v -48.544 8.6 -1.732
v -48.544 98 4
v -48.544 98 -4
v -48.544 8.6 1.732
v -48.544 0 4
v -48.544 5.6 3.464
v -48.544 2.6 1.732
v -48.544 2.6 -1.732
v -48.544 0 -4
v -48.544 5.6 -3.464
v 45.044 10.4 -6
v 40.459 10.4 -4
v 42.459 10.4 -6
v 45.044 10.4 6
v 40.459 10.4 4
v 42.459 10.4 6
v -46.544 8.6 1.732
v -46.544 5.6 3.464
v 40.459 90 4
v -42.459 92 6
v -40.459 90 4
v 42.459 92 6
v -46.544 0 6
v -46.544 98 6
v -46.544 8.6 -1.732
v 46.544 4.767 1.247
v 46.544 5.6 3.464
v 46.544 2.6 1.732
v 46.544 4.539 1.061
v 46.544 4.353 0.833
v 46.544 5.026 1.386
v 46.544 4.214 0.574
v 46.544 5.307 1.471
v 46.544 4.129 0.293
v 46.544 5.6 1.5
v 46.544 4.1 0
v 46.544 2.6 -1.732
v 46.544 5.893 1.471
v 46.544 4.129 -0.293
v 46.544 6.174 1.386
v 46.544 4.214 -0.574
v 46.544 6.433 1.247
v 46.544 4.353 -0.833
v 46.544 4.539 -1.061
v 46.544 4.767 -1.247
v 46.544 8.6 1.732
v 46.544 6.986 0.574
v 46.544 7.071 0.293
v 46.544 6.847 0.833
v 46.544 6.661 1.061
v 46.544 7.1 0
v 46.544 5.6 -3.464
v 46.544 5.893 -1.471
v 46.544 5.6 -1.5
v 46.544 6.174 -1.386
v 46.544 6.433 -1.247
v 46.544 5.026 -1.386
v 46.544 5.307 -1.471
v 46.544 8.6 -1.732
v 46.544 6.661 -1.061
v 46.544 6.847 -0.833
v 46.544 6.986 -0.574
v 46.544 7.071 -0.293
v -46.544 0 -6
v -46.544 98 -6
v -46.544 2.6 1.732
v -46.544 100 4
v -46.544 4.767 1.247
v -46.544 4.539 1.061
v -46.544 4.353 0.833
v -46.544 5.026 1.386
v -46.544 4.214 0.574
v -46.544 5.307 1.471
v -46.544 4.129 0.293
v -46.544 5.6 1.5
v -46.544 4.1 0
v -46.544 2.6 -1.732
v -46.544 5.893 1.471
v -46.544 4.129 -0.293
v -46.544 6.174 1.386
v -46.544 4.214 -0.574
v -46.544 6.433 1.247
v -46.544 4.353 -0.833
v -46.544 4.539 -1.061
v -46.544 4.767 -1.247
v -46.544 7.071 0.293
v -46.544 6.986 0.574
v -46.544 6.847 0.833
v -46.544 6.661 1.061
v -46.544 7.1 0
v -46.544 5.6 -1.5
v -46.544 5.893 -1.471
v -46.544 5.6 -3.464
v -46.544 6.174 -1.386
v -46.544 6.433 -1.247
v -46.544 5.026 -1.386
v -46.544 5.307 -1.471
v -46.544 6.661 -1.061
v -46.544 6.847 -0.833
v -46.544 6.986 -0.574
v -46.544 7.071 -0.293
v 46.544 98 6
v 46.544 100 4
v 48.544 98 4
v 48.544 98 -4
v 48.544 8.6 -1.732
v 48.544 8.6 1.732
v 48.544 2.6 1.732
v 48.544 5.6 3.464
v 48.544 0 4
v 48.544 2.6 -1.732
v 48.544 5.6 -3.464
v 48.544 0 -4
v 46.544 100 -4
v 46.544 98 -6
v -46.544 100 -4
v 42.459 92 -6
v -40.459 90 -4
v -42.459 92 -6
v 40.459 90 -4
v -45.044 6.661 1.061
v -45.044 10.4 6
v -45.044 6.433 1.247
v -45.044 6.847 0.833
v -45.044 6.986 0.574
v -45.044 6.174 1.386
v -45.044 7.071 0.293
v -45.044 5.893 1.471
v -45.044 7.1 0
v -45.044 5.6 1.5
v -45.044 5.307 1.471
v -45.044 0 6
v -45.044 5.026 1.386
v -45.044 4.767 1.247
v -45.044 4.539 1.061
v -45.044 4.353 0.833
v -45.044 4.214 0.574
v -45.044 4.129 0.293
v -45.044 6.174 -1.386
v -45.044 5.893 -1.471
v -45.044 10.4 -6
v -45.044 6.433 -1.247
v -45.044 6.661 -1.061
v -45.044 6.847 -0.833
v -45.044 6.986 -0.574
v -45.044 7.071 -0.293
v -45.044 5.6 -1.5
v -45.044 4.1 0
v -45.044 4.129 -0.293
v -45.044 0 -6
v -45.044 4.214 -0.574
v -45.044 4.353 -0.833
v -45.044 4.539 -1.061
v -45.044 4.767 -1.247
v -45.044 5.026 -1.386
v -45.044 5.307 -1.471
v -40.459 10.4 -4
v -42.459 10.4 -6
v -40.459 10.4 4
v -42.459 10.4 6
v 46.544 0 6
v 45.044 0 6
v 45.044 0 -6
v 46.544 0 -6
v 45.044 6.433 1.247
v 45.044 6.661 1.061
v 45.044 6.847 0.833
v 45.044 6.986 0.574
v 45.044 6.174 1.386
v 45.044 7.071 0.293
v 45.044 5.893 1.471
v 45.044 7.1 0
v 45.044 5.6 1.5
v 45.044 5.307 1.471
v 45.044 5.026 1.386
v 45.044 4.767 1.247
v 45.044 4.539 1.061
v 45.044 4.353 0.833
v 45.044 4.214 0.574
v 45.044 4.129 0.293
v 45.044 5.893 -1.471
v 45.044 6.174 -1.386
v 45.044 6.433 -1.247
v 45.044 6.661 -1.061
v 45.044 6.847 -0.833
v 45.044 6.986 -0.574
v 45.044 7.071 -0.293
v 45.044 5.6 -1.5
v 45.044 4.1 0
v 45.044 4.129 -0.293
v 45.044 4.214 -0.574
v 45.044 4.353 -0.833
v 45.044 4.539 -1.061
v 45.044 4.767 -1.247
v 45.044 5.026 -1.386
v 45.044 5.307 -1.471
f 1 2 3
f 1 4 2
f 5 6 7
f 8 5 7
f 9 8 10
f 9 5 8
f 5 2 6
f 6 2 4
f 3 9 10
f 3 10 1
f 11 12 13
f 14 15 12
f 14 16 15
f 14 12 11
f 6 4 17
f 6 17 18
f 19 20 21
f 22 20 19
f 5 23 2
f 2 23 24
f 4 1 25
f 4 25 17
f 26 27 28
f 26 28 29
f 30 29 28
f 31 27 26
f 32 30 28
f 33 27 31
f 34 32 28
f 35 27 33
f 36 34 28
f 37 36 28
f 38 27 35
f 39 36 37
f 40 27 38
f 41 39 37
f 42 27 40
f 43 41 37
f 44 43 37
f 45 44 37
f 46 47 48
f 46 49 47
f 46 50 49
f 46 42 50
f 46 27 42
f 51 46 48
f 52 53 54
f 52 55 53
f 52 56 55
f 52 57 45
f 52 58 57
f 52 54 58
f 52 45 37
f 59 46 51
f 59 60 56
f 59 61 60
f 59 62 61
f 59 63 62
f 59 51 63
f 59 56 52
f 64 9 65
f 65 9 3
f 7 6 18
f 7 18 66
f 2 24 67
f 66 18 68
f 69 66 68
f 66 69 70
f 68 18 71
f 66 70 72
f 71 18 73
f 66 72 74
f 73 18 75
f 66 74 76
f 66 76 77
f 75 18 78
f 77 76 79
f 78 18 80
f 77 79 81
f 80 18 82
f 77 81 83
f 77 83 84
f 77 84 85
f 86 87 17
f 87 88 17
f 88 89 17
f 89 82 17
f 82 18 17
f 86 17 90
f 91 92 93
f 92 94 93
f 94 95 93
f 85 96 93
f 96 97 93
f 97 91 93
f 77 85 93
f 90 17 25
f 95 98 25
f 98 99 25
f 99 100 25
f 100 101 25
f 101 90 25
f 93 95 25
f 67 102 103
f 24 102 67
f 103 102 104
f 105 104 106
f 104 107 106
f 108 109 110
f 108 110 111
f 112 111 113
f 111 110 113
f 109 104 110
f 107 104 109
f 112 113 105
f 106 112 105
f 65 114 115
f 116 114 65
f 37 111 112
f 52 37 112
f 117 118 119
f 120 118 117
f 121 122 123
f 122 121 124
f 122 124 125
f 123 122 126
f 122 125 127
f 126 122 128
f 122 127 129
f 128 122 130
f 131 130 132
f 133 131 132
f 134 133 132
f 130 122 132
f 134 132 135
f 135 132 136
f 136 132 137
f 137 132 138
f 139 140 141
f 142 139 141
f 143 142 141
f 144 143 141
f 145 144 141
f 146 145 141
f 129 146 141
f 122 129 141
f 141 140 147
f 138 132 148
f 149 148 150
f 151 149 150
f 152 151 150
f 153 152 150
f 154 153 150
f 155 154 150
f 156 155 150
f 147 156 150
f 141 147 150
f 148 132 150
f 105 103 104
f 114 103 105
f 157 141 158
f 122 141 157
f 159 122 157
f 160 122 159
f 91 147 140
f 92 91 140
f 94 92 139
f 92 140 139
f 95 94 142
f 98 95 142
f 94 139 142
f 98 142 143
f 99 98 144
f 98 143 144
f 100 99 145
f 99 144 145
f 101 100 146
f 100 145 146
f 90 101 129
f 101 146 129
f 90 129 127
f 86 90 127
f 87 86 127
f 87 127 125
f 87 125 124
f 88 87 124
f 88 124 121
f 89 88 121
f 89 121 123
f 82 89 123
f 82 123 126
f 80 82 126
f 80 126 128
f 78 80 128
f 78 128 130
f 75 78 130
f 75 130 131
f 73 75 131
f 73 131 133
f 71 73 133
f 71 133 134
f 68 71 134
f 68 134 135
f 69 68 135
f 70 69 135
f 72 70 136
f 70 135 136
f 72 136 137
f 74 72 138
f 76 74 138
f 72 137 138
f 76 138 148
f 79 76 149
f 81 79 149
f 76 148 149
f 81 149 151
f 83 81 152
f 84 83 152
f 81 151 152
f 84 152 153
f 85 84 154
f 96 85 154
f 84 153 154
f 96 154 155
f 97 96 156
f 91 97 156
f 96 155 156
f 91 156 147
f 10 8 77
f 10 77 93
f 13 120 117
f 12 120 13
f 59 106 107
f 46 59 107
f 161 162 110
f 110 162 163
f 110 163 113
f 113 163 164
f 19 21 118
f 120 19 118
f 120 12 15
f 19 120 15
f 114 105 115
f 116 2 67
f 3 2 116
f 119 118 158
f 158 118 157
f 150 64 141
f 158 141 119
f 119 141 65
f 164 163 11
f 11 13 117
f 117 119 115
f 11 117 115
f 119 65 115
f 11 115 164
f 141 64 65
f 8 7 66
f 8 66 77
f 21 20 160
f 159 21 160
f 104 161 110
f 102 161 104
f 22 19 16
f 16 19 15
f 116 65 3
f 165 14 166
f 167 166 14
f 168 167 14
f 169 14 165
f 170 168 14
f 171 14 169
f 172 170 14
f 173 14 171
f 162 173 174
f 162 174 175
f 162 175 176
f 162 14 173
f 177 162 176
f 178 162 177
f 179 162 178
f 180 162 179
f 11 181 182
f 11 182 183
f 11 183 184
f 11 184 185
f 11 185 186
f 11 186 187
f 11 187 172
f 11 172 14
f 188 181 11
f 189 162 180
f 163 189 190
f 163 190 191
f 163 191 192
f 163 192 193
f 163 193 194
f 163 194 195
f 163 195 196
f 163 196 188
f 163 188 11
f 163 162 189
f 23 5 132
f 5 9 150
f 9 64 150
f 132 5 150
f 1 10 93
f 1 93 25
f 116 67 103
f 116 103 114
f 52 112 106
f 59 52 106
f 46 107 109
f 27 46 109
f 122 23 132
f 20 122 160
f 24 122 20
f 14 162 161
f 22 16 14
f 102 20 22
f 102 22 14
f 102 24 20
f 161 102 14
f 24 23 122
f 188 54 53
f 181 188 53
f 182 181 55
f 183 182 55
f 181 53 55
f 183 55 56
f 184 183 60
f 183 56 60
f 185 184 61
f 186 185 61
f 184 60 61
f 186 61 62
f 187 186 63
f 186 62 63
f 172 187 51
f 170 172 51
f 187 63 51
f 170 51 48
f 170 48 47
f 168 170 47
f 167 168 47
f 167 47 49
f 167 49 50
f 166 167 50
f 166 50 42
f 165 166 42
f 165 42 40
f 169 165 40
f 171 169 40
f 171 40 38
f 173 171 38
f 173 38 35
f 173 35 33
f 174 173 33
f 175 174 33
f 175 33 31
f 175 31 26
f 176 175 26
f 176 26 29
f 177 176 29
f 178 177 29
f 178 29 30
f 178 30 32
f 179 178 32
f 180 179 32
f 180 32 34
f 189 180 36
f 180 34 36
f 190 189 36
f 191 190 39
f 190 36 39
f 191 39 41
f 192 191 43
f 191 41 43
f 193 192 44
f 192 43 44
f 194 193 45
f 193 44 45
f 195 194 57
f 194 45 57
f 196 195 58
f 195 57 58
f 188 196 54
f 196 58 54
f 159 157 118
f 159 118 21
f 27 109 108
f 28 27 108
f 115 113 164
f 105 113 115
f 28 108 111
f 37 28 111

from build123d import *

# Parameters (mm, degrees)
SKETCH1_W             = 3.5
SKETCH1_H             = 12
BOSS_EXTRUDE1_DEPTH   = 100
BOSS_EXTRUDE1_2_DEPTH = 100
SKETCH2_W             = 12
SKETCH2_H             = 10
BOSS_EXTRUDE2_DEPTH   = 90.08829946
SKETCH3_W             = 4.58560389
SKETCH3_H             = 12
BOSS_EXTRUDE3_DEPTH   = 79.6
CHAMFER6_SIZE         = 2
CUT_EXTRUDE1_DEPTH    = 2
CUT_EXTRUDE2_REACH    = 140.122
SKETCH5_R             = 1.5


with BuildPart() as part:
    # Sketch1 → Boss-Extrude1 (new body)
    with BuildSketch(Plane(origin=(0, 0, 0), x_dir=(1, 0, 0), z_dir=(0, 1, 0))):
        with Locations((-46.79414973, 0)):
            Rectangle(SKETCH1_W, SKETCH1_H)
    extrude(amount=BOSS_EXTRUDE1_DEPTH)



with BuildPart() as body_2:
    # Sketch1 → Boss-Extrude1 2 (new body)
    with BuildSketch(Plane(origin=(0, 0, 0), x_dir=(1, 0, 0), z_dir=(0, 1, 0))):
        with Locations((46.79414973, 0)):
            Rectangle(SKETCH1_W, SKETCH1_H)
    extrude(amount=BOSS_EXTRUDE1_2_DEPTH)


with BuildPart() as part_1:
    add(part.part)

    add(body_2.part)  # Boss-Extrude2 merges body 2
    # Sketch2 → Boss-Extrude2 (add)
    with BuildSketch(Plane(origin=(-45.04414973, 0, 0), x_dir=(0, 0, -1), z_dir=(1, 0, 0))):
        with Locations((0, 95)):
            Rectangle(SKETCH2_W, SKETCH2_H)
    extrude(amount=BOSS_EXTRUDE2_DEPTH)

    # Sketch3 → Boss-Extrude3 (add)
    with BuildSketch(Plane.XZ.offset(-90)):
        with Locations((-42.751347785, 0)):
            Rectangle(SKETCH3_W, SKETCH3_H)
        with Locations((42.751347785, 0)):
            Rectangle(SKETCH3_W, SKETCH3_H)
    extrude(amount=BOSS_EXTRUDE3_DEPTH)

    # Chamfer6
    chamfer6_edges = [part_1.edges().sort_by_distance(p)[0] for p in [
        (0, 100, 6),
        (48.54414973, 50, 6),
        (48.54414973, 50, -6),
        (48.54414973, 100, 0),
        (0, 100, -6),
        (-40.45854584, 50.2, -6),
        (-40.45854584, 50.2, 6),
        (0, 90, 6),
        (0, 90, -6),
        (40.45854584, 50.2, 6),
        (40.45854584, 50.2, -6),
        (-48.54414973, 50, 6),
        (-48.54414973, 50, -6),
        (-48.54414973, 100, 0),
    ]]
    chamfer(chamfer6_edges, length=CHAMFER6_SIZE)

    # Sketch4 → Cut-Extrude1 (cut)
    with BuildSketch(Plane(origin=(48.54414973, 0, 0), x_dir=(0, 0, -1), z_dir=(1, 0, 0))):
        Polygon((3.464101615, 5.6), (1.732050808, 8.6), (-1.732050808, 8.6), (-3.464101615, 5.6), (-1.732050808, 2.6), (1.732050808, 2.6), align=None)
    cut_extrude1 = extrude(amount=-CUT_EXTRUDE1_DEPTH, mode=Mode.SUBTRACT)

    # Mirror1: Cut-Extrude1 across plane
    add(cut_extrude1.mirror(Plane(origin=(0, 0, 0), x_dir=(0, 0, 1), z_dir=(1, 0, 0))), mode=Mode.SUBTRACT)

    # Cut-Extrude2: up to this face of the body (flat: up to its plane)
    cut_extrude2_end = Plane(part_1.part.faces().sort_by_distance((-46.54414973, 5.6, 0))[0])
    # Sketch5 → Cut-Extrude2 (cut, up to the picked face)
    with BuildSketch(Plane(origin=(46.54414973, 0, 0), x_dir=(0, 0, -1), z_dir=(1, 0, 0)), mode=Mode.PRIVATE) as cut_extrude2_sk1:
        with Locations((0, 5.6)):
            Circle(SKETCH5_R)
    cut_extrude2_tool1 = split(extrude(cut_extrude2_sk1.sketch, amount=-CUT_EXTRUDE2_REACH, mode=Mode.PRIVATE), bisect_by=cut_extrude2_end, keep=Keep.BOTH, mode=Mode.PRIVATE)
    add(cut_extrude2_tool1.solids().sort_by(Axis((46.54415, 5.6, 0), (-1, 0, 0)))[0], mode=Mode.SUBTRACT)


solid = part_1.part
